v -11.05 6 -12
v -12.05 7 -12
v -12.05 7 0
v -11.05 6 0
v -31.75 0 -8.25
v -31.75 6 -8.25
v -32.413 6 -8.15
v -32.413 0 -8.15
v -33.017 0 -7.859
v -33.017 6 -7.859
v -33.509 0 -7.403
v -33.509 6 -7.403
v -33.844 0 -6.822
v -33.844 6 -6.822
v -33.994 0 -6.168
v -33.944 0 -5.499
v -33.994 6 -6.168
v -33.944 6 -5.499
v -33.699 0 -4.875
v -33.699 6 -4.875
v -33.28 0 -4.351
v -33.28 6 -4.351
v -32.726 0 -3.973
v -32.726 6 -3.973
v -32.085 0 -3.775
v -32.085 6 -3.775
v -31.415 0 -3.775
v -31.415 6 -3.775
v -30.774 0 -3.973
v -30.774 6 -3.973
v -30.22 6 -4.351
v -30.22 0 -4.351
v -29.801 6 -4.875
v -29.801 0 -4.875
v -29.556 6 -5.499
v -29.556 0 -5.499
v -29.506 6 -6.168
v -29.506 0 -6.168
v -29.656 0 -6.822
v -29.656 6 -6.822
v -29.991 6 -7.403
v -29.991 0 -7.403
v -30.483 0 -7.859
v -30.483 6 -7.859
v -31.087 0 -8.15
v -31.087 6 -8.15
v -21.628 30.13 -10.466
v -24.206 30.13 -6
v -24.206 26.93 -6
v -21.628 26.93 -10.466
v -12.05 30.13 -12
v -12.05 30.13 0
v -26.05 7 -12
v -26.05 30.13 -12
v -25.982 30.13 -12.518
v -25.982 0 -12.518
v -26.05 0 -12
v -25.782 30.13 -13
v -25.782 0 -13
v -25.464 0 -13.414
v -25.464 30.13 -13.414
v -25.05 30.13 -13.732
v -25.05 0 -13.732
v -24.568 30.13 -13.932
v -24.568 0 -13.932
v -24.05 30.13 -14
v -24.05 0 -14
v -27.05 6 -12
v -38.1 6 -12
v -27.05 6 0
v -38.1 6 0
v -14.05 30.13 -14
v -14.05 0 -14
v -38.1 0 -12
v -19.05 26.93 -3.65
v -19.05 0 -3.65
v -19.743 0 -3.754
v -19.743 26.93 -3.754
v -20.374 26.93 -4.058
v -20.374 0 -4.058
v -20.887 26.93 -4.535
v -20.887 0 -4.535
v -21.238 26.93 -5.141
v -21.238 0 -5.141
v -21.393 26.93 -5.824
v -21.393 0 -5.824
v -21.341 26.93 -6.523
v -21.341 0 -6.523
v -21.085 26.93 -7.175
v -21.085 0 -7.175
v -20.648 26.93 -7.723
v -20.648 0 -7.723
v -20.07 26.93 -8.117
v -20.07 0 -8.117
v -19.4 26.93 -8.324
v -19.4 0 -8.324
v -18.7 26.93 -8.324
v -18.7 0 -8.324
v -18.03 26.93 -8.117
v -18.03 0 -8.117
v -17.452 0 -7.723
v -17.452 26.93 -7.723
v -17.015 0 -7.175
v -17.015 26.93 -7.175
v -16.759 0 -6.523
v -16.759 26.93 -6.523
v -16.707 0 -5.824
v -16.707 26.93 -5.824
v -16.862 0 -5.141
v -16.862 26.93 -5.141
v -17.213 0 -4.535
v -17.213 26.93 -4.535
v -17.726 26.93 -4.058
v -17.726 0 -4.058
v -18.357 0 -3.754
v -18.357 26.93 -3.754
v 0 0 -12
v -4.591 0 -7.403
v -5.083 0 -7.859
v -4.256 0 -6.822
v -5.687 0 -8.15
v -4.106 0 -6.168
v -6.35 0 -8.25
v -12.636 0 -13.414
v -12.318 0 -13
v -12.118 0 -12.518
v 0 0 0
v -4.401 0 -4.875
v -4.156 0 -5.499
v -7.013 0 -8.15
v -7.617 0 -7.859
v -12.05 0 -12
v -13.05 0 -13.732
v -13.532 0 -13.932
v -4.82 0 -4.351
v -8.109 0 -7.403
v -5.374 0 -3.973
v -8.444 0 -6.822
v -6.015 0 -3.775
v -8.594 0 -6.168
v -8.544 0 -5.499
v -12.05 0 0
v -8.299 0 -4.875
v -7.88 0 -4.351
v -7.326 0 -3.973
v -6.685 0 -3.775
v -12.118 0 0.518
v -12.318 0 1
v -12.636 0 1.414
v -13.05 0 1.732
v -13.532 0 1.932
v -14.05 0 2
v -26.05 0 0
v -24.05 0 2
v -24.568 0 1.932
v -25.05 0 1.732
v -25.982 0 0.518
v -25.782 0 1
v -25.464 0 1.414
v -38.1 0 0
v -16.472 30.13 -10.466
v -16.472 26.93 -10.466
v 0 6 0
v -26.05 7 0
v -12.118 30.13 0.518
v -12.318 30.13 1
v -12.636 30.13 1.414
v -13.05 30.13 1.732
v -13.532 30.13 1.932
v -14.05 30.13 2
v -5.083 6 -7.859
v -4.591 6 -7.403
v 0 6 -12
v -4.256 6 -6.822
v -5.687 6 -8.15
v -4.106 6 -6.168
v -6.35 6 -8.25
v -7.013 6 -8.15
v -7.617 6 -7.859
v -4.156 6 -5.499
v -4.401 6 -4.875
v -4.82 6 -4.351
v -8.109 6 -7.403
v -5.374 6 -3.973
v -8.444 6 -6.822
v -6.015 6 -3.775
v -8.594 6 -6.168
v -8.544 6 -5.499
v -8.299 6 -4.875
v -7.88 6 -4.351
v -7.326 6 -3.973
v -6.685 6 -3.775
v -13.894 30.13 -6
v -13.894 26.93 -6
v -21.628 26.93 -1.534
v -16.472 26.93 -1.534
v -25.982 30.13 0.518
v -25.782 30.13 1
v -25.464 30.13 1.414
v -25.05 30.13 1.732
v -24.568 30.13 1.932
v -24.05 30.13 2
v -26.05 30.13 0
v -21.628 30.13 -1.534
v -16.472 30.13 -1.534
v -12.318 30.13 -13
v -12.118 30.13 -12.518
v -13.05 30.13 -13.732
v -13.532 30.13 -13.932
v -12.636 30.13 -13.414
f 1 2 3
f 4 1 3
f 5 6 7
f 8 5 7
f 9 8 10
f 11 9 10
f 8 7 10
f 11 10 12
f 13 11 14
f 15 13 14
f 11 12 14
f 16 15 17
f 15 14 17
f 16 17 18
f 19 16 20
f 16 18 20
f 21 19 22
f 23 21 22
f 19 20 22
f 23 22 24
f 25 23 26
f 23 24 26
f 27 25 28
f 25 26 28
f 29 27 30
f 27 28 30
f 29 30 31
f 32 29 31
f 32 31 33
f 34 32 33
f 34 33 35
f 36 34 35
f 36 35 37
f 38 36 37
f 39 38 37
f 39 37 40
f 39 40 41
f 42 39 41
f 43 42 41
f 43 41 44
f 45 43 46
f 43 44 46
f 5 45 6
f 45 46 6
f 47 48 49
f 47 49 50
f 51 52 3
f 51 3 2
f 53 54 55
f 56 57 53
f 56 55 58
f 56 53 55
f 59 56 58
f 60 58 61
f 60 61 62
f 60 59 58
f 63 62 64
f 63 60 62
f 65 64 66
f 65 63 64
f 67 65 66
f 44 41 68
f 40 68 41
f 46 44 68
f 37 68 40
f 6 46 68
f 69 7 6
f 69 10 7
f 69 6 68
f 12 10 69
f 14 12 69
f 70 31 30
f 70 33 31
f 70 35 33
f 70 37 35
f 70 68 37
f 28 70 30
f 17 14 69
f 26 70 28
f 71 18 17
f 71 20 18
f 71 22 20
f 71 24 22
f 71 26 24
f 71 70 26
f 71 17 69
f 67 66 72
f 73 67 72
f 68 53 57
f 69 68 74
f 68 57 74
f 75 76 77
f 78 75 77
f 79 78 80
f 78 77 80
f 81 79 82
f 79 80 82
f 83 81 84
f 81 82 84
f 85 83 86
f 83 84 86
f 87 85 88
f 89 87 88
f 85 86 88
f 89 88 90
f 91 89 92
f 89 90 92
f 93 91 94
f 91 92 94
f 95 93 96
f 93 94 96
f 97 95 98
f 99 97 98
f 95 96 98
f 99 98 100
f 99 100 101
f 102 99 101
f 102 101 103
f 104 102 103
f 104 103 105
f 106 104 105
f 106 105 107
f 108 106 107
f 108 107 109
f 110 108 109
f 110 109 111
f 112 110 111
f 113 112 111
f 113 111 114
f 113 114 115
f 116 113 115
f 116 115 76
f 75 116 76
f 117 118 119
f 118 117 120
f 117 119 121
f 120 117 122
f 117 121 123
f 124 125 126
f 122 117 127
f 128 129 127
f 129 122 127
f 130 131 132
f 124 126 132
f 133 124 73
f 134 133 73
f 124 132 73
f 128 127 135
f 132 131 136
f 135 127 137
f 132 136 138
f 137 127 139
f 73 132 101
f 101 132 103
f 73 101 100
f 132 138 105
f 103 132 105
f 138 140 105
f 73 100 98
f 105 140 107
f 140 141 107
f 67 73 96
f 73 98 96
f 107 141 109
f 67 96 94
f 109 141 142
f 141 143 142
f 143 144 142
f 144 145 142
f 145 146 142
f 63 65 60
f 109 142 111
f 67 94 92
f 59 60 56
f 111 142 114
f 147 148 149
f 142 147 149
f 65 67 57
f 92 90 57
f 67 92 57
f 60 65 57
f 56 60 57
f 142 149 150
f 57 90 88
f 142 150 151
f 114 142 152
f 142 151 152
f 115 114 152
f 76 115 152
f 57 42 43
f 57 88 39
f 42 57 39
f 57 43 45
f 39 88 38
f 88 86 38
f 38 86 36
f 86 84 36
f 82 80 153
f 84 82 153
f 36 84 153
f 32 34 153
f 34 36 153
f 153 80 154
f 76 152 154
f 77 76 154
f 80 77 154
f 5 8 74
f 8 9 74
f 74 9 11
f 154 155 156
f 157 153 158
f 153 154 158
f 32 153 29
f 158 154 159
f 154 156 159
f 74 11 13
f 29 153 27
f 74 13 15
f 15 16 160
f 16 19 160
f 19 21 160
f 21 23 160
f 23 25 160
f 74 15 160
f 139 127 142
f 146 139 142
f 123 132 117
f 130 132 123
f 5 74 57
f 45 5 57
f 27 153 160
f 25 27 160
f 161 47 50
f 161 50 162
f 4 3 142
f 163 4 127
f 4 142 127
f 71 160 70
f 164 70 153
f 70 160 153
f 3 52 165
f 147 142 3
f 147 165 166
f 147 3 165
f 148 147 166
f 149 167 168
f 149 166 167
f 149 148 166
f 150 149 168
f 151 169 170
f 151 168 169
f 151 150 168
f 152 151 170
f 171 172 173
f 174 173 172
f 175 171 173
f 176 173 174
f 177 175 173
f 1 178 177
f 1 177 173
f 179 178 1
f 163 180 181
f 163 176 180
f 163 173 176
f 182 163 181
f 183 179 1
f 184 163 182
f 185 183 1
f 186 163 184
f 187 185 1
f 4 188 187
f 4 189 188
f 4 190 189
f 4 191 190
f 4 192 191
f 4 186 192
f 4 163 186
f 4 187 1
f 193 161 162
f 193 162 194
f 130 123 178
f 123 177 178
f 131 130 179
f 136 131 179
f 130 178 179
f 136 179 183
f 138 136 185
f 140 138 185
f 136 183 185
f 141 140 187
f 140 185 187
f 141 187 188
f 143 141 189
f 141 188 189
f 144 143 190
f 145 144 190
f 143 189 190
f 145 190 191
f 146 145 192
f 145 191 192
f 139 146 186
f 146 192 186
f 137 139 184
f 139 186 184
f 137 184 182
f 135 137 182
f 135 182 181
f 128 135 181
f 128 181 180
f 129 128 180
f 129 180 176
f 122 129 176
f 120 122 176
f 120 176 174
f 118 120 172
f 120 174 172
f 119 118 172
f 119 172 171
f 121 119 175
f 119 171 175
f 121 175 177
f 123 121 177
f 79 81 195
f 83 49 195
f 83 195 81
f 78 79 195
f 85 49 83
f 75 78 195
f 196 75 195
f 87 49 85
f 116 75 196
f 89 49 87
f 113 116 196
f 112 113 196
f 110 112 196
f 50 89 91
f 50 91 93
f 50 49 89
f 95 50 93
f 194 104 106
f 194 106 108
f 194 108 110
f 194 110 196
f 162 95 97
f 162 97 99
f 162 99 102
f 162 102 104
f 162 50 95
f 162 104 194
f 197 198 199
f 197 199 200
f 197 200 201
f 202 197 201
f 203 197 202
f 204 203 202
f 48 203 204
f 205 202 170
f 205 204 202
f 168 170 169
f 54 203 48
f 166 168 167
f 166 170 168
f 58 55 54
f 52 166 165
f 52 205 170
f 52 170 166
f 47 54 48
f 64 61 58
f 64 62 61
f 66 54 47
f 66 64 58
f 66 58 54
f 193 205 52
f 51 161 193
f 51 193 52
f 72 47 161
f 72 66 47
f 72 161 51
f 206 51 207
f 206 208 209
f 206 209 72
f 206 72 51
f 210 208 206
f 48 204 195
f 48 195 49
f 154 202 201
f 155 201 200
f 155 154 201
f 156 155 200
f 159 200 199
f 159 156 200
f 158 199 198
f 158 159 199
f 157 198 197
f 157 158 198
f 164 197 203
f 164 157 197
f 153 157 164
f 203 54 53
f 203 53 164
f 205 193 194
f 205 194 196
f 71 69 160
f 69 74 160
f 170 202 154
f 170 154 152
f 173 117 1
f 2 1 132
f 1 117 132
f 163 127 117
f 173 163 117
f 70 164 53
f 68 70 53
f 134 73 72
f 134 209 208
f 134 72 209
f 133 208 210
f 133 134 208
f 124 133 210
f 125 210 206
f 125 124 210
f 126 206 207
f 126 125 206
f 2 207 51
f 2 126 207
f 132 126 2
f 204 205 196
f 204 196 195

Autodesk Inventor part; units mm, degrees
ref_plane "YZ Plane" through (0, 0, 0) normal (1, 0, 0) x (0, 1, 0)
ref_plane "XZ Plane" through (0, 0, 0) normal (0, 1, 0) x (-1, 0, 0)
ref_plane "XY Plane" through (0, 0, 0) normal (0, 0, 1) x (1, 0, 0)
sketch "Sketch1" plane through (0, 0, 0) normal (0, 1, 0) x (-1, 0, 0)
  line L0 (0, 0) -> (0, -12)
  line L1 (0, -12) -> (38.1, -12)
  line L2 (38.1, -12) -> (38.1, 0)
  line L3 (38.1, 0) -> (0, 0)
  circle A0 centre (6.35, -6) radius 1.6256
  circle A1 centre (31.75, -6) radius 1.6256
  point P0 (0, -6)
  dimension "d0" = 3.2512
  dimension "d1" = 3.2512
  dimension "d3" = 0
  dimension "d4" = 12
  dimension "d6" = 38.1
  dimension "d37" = 6.35
  dimension "d38" = 6.35
extrude "Extrusion1" add sketch "Sketch1" along normal blind 6 contours L3 L2 L1 L0 | A0 | A1
sketch "Sketch3" plane through (0, 6, 0) normal (0, 1, 0) x (1, 0, 0)
  line L0 (-14.05, 0) -> (-24.05, 0)
  line L1 (-24.05, 0) -> (-24.05, 12)
  line L2 (-24.05, 12) -> (-14.05, 12)
  line L3 (-14.05, 12) -> (-14.05, 0)
  line L4 (-38.1, 0) -> (0, 0) projected
  line L5 (0, 0) -> (0, 12) projected
  line L6 (0, 12) -> (-38.1, 12) projected
  point P0 (-19.05, 12)
  point P1 (-19.05, 12)
  point P2 (-19.05, 12)
  dimension "d12" = 10
  dimension "d14" = 0
extrude "Extrusion3" add sketch "Sketch3" along normal blind 24.13 contours L0 L1 L2 L3
chamfer "Chamfer1" distance 3 angle 45 2 edges at (-14.05, 6, -6) (-24.05, 6, -6)
sketch "Sketch5" plane through (0, 30.13, 0) normal (0, 1, 0) x (1, 0, 0)
  line L0 (-14.05, 12) -> (-24.05, 12) projected
  line L1 (-14.05, 0) -> (-14.05, 12) projected
  point P0 (0, 0)
  point P1 (-19.05, 6)
  point P2 (-19.05, 12)
  point P3 (-14.05, 6)
hole "Hole1" at (-19.05, 30.13, -6) direction (0, -1, 0) diameter 4.7 end through all clearance for "Flat Head Machine Screw" size "M4" standard "Ansi Metric M Profile"
hole "Hole2" at (-6.35, 0, -6) at (-31.75, 0, -6) direction (0, 1, 0) diameter 4.5 end through all clearance for "Flat Head Machine Screw" size "M4" standard "Ansi Metric M Profile"
sketch "Sketch7" plane through (0, 30.13, 0) normal (0, 1, 0) x (1, 0, 0)
  line L0 (-14.05, 12) -> (-24.05, 12) projected
  line L1 (-24.05, 12) -> (-24.05, 14)
  line L2 (-24.05, 14) -> (-14.05, 14)
  line L3 (-11.05, 12) -> (-14.05, 12) projected
  line L4 (-24.05, 12) -> (-14.05, 12)
  line L5 (-14.05, 0) -> (-14.05, 12) projected
  line L6 (-14.05, 0) -> (-14.05, -2)
  line L7 (-14.05, -2) -> (-24.05, -2)
  line L8 (-24.05, 0) -> (-14.05, 0) projected
  line L9 (-24.05, -2) -> (-24.05, 0)
  line L10 (-24.05, 0) -> (-14.05, 0)
  line L11 (-24.05, 14) -> (-26.05, 14)
  line L12 (-26.05, 14) -> (-26.05, -2)
  line L13 (-26.05, -2) -> (-24.05, -2)
  line L14 (-24.05, -2) -> (-24.05, 14)
  line L15 (-14.05, -2) -> (-12.05, -2)
  line L16 (-12.05, -2) -> (-12.05, 14)
  line L17 (-12.05, 14) -> (-14.05, 14)
  line L18 (-14.05, 12) -> (-14.05, -2)
  point P0 (0, 0)
  point P1 (-12.05, 12)
  point P2 (-24.05, 0)
  point P3 (-25.05, -2)
  dimension "d41" = 2
  dimension "d42" = 2
  dimension "d43" = 2
  dimension "d44" = 2
extrude "Extrusion6" add sketch "Sketch7" against normal up to surface (30.13 mm away) contours L0 L1 L2 L17 L16 L3 | L3 L16 L15 L6 L5 | L14 L9 L13 L12 L11 L1 | L6 L7 L9 L8
sketch "Sketch6" plane through (0, 30.13, 0) normal (0, 1, 0) x (1, 0, 0)
  line L0 (-17.0293, 9.5) -> (-16.0189, 7.75) projected
  line L1 (-16.0189, 7.75) -> (-15.0085, 6) projected
  line L2 (-15.0085, 6) -> (-16.0189, 4.25) projected
  line L3 (-16.0189, 4.25) -> (-17.0293, 2.5) projected
  line L4 (-17.0293, 2.5) -> (-19.05, 2.5) projected
  line L5 (-19.05, 2.5) -> (-21.0707, 2.5) projected
  line L6 (-21.0707, 2.5) -> (-22.0811, 4.25) projected
  line L7 (-22.0811, 4.25) -> (-23.0915, 6) projected
  line L8 (-23.0915, 6) -> (-22.0811, 7.75) projected
  line L9 (-22.0811, 7.75) -> (-21.0707, 9.5) projected
  line L10 (-21.0707, 9.5) -> (-19.05, 9.5) projected
  line L11 (-19.05, 9.5) -> (-17.0293, 9.5) projected
  line L12 (-19.05, 10.3656) -> (-21.5705, 10.3656) projected
  line L13 (-16.5295, 10.3656) -> (-19.05, 10.3656) projected
  line L14 (-15.2693, 8.1828) -> (-16.5295, 10.3656) projected
  line L15 (-14.009, 6) -> (-15.2693, 8.1828) projected
  line L16 (-15.2693, 3.8172) -> (-14.009, 6) projected
  line L17 (-16.5295, 1.6344) -> (-15.2693, 3.8172) projected
  line L18 (-19.05, 1.6344) -> (-16.5295, 1.6344) projected
  line L19 (-21.5705, 1.6344) -> (-19.05, 1.6344) projected
  line L20 (-22.8307, 3.8172) -> (-21.5705, 1.6344) projected
  line L21 (-24.091, 6) -> (-22.8307, 3.8172) projected
  line L22 (-22.8307, 8.1828) -> (-24.091, 6) projected
  line L23 (-21.5705, 10.3656) -> (-22.8307, 8.1828) projected
  line L24 (-21.6282, 10.4656) -> (-16.4718, 10.4656)
  line L25 (-16.4718, 10.4656) -> (-13.8935, 6)
  line L26 (-13.8935, 6) -> (-16.4718, 1.5344)
  line L27 (-16.4718, 1.5344) -> (-21.6282, 1.5344)
  line L28 (-21.6282, 1.5344) -> (-24.2065, 6)
  line L29 (-24.2065, 6) -> (-21.6282, 10.4656)
  point P0 (0, 0)
  dimension "d50" = 0.1
  dimension "d51" = 0.1
  dimension "d52" = 0.1
  dimension "d53" = 0.1
  dimension "d54" = 0.1
  dimension "d55" = 0.1
extrude "Extrusion5" cut sketch "Sketch6" against normal blind 3.2 contours L0 L1 L2 L3 L4 L5 L6 L7 L8 L9 L10 L11 | L13 L14 L15 L16 L17 L18 L19 L20 L21 L22 L23 L12 | L24 L25 L26 L27 L28 L29
fillet "Fillet1" radius 2 4 edges at (-12.05, 15.065, -14) (-26.05, 15.065, -14) (-26.05, 15.065, 2) (-12.05, 15.065, 2)
properties part number "Hopper Rest Metric Wide"
